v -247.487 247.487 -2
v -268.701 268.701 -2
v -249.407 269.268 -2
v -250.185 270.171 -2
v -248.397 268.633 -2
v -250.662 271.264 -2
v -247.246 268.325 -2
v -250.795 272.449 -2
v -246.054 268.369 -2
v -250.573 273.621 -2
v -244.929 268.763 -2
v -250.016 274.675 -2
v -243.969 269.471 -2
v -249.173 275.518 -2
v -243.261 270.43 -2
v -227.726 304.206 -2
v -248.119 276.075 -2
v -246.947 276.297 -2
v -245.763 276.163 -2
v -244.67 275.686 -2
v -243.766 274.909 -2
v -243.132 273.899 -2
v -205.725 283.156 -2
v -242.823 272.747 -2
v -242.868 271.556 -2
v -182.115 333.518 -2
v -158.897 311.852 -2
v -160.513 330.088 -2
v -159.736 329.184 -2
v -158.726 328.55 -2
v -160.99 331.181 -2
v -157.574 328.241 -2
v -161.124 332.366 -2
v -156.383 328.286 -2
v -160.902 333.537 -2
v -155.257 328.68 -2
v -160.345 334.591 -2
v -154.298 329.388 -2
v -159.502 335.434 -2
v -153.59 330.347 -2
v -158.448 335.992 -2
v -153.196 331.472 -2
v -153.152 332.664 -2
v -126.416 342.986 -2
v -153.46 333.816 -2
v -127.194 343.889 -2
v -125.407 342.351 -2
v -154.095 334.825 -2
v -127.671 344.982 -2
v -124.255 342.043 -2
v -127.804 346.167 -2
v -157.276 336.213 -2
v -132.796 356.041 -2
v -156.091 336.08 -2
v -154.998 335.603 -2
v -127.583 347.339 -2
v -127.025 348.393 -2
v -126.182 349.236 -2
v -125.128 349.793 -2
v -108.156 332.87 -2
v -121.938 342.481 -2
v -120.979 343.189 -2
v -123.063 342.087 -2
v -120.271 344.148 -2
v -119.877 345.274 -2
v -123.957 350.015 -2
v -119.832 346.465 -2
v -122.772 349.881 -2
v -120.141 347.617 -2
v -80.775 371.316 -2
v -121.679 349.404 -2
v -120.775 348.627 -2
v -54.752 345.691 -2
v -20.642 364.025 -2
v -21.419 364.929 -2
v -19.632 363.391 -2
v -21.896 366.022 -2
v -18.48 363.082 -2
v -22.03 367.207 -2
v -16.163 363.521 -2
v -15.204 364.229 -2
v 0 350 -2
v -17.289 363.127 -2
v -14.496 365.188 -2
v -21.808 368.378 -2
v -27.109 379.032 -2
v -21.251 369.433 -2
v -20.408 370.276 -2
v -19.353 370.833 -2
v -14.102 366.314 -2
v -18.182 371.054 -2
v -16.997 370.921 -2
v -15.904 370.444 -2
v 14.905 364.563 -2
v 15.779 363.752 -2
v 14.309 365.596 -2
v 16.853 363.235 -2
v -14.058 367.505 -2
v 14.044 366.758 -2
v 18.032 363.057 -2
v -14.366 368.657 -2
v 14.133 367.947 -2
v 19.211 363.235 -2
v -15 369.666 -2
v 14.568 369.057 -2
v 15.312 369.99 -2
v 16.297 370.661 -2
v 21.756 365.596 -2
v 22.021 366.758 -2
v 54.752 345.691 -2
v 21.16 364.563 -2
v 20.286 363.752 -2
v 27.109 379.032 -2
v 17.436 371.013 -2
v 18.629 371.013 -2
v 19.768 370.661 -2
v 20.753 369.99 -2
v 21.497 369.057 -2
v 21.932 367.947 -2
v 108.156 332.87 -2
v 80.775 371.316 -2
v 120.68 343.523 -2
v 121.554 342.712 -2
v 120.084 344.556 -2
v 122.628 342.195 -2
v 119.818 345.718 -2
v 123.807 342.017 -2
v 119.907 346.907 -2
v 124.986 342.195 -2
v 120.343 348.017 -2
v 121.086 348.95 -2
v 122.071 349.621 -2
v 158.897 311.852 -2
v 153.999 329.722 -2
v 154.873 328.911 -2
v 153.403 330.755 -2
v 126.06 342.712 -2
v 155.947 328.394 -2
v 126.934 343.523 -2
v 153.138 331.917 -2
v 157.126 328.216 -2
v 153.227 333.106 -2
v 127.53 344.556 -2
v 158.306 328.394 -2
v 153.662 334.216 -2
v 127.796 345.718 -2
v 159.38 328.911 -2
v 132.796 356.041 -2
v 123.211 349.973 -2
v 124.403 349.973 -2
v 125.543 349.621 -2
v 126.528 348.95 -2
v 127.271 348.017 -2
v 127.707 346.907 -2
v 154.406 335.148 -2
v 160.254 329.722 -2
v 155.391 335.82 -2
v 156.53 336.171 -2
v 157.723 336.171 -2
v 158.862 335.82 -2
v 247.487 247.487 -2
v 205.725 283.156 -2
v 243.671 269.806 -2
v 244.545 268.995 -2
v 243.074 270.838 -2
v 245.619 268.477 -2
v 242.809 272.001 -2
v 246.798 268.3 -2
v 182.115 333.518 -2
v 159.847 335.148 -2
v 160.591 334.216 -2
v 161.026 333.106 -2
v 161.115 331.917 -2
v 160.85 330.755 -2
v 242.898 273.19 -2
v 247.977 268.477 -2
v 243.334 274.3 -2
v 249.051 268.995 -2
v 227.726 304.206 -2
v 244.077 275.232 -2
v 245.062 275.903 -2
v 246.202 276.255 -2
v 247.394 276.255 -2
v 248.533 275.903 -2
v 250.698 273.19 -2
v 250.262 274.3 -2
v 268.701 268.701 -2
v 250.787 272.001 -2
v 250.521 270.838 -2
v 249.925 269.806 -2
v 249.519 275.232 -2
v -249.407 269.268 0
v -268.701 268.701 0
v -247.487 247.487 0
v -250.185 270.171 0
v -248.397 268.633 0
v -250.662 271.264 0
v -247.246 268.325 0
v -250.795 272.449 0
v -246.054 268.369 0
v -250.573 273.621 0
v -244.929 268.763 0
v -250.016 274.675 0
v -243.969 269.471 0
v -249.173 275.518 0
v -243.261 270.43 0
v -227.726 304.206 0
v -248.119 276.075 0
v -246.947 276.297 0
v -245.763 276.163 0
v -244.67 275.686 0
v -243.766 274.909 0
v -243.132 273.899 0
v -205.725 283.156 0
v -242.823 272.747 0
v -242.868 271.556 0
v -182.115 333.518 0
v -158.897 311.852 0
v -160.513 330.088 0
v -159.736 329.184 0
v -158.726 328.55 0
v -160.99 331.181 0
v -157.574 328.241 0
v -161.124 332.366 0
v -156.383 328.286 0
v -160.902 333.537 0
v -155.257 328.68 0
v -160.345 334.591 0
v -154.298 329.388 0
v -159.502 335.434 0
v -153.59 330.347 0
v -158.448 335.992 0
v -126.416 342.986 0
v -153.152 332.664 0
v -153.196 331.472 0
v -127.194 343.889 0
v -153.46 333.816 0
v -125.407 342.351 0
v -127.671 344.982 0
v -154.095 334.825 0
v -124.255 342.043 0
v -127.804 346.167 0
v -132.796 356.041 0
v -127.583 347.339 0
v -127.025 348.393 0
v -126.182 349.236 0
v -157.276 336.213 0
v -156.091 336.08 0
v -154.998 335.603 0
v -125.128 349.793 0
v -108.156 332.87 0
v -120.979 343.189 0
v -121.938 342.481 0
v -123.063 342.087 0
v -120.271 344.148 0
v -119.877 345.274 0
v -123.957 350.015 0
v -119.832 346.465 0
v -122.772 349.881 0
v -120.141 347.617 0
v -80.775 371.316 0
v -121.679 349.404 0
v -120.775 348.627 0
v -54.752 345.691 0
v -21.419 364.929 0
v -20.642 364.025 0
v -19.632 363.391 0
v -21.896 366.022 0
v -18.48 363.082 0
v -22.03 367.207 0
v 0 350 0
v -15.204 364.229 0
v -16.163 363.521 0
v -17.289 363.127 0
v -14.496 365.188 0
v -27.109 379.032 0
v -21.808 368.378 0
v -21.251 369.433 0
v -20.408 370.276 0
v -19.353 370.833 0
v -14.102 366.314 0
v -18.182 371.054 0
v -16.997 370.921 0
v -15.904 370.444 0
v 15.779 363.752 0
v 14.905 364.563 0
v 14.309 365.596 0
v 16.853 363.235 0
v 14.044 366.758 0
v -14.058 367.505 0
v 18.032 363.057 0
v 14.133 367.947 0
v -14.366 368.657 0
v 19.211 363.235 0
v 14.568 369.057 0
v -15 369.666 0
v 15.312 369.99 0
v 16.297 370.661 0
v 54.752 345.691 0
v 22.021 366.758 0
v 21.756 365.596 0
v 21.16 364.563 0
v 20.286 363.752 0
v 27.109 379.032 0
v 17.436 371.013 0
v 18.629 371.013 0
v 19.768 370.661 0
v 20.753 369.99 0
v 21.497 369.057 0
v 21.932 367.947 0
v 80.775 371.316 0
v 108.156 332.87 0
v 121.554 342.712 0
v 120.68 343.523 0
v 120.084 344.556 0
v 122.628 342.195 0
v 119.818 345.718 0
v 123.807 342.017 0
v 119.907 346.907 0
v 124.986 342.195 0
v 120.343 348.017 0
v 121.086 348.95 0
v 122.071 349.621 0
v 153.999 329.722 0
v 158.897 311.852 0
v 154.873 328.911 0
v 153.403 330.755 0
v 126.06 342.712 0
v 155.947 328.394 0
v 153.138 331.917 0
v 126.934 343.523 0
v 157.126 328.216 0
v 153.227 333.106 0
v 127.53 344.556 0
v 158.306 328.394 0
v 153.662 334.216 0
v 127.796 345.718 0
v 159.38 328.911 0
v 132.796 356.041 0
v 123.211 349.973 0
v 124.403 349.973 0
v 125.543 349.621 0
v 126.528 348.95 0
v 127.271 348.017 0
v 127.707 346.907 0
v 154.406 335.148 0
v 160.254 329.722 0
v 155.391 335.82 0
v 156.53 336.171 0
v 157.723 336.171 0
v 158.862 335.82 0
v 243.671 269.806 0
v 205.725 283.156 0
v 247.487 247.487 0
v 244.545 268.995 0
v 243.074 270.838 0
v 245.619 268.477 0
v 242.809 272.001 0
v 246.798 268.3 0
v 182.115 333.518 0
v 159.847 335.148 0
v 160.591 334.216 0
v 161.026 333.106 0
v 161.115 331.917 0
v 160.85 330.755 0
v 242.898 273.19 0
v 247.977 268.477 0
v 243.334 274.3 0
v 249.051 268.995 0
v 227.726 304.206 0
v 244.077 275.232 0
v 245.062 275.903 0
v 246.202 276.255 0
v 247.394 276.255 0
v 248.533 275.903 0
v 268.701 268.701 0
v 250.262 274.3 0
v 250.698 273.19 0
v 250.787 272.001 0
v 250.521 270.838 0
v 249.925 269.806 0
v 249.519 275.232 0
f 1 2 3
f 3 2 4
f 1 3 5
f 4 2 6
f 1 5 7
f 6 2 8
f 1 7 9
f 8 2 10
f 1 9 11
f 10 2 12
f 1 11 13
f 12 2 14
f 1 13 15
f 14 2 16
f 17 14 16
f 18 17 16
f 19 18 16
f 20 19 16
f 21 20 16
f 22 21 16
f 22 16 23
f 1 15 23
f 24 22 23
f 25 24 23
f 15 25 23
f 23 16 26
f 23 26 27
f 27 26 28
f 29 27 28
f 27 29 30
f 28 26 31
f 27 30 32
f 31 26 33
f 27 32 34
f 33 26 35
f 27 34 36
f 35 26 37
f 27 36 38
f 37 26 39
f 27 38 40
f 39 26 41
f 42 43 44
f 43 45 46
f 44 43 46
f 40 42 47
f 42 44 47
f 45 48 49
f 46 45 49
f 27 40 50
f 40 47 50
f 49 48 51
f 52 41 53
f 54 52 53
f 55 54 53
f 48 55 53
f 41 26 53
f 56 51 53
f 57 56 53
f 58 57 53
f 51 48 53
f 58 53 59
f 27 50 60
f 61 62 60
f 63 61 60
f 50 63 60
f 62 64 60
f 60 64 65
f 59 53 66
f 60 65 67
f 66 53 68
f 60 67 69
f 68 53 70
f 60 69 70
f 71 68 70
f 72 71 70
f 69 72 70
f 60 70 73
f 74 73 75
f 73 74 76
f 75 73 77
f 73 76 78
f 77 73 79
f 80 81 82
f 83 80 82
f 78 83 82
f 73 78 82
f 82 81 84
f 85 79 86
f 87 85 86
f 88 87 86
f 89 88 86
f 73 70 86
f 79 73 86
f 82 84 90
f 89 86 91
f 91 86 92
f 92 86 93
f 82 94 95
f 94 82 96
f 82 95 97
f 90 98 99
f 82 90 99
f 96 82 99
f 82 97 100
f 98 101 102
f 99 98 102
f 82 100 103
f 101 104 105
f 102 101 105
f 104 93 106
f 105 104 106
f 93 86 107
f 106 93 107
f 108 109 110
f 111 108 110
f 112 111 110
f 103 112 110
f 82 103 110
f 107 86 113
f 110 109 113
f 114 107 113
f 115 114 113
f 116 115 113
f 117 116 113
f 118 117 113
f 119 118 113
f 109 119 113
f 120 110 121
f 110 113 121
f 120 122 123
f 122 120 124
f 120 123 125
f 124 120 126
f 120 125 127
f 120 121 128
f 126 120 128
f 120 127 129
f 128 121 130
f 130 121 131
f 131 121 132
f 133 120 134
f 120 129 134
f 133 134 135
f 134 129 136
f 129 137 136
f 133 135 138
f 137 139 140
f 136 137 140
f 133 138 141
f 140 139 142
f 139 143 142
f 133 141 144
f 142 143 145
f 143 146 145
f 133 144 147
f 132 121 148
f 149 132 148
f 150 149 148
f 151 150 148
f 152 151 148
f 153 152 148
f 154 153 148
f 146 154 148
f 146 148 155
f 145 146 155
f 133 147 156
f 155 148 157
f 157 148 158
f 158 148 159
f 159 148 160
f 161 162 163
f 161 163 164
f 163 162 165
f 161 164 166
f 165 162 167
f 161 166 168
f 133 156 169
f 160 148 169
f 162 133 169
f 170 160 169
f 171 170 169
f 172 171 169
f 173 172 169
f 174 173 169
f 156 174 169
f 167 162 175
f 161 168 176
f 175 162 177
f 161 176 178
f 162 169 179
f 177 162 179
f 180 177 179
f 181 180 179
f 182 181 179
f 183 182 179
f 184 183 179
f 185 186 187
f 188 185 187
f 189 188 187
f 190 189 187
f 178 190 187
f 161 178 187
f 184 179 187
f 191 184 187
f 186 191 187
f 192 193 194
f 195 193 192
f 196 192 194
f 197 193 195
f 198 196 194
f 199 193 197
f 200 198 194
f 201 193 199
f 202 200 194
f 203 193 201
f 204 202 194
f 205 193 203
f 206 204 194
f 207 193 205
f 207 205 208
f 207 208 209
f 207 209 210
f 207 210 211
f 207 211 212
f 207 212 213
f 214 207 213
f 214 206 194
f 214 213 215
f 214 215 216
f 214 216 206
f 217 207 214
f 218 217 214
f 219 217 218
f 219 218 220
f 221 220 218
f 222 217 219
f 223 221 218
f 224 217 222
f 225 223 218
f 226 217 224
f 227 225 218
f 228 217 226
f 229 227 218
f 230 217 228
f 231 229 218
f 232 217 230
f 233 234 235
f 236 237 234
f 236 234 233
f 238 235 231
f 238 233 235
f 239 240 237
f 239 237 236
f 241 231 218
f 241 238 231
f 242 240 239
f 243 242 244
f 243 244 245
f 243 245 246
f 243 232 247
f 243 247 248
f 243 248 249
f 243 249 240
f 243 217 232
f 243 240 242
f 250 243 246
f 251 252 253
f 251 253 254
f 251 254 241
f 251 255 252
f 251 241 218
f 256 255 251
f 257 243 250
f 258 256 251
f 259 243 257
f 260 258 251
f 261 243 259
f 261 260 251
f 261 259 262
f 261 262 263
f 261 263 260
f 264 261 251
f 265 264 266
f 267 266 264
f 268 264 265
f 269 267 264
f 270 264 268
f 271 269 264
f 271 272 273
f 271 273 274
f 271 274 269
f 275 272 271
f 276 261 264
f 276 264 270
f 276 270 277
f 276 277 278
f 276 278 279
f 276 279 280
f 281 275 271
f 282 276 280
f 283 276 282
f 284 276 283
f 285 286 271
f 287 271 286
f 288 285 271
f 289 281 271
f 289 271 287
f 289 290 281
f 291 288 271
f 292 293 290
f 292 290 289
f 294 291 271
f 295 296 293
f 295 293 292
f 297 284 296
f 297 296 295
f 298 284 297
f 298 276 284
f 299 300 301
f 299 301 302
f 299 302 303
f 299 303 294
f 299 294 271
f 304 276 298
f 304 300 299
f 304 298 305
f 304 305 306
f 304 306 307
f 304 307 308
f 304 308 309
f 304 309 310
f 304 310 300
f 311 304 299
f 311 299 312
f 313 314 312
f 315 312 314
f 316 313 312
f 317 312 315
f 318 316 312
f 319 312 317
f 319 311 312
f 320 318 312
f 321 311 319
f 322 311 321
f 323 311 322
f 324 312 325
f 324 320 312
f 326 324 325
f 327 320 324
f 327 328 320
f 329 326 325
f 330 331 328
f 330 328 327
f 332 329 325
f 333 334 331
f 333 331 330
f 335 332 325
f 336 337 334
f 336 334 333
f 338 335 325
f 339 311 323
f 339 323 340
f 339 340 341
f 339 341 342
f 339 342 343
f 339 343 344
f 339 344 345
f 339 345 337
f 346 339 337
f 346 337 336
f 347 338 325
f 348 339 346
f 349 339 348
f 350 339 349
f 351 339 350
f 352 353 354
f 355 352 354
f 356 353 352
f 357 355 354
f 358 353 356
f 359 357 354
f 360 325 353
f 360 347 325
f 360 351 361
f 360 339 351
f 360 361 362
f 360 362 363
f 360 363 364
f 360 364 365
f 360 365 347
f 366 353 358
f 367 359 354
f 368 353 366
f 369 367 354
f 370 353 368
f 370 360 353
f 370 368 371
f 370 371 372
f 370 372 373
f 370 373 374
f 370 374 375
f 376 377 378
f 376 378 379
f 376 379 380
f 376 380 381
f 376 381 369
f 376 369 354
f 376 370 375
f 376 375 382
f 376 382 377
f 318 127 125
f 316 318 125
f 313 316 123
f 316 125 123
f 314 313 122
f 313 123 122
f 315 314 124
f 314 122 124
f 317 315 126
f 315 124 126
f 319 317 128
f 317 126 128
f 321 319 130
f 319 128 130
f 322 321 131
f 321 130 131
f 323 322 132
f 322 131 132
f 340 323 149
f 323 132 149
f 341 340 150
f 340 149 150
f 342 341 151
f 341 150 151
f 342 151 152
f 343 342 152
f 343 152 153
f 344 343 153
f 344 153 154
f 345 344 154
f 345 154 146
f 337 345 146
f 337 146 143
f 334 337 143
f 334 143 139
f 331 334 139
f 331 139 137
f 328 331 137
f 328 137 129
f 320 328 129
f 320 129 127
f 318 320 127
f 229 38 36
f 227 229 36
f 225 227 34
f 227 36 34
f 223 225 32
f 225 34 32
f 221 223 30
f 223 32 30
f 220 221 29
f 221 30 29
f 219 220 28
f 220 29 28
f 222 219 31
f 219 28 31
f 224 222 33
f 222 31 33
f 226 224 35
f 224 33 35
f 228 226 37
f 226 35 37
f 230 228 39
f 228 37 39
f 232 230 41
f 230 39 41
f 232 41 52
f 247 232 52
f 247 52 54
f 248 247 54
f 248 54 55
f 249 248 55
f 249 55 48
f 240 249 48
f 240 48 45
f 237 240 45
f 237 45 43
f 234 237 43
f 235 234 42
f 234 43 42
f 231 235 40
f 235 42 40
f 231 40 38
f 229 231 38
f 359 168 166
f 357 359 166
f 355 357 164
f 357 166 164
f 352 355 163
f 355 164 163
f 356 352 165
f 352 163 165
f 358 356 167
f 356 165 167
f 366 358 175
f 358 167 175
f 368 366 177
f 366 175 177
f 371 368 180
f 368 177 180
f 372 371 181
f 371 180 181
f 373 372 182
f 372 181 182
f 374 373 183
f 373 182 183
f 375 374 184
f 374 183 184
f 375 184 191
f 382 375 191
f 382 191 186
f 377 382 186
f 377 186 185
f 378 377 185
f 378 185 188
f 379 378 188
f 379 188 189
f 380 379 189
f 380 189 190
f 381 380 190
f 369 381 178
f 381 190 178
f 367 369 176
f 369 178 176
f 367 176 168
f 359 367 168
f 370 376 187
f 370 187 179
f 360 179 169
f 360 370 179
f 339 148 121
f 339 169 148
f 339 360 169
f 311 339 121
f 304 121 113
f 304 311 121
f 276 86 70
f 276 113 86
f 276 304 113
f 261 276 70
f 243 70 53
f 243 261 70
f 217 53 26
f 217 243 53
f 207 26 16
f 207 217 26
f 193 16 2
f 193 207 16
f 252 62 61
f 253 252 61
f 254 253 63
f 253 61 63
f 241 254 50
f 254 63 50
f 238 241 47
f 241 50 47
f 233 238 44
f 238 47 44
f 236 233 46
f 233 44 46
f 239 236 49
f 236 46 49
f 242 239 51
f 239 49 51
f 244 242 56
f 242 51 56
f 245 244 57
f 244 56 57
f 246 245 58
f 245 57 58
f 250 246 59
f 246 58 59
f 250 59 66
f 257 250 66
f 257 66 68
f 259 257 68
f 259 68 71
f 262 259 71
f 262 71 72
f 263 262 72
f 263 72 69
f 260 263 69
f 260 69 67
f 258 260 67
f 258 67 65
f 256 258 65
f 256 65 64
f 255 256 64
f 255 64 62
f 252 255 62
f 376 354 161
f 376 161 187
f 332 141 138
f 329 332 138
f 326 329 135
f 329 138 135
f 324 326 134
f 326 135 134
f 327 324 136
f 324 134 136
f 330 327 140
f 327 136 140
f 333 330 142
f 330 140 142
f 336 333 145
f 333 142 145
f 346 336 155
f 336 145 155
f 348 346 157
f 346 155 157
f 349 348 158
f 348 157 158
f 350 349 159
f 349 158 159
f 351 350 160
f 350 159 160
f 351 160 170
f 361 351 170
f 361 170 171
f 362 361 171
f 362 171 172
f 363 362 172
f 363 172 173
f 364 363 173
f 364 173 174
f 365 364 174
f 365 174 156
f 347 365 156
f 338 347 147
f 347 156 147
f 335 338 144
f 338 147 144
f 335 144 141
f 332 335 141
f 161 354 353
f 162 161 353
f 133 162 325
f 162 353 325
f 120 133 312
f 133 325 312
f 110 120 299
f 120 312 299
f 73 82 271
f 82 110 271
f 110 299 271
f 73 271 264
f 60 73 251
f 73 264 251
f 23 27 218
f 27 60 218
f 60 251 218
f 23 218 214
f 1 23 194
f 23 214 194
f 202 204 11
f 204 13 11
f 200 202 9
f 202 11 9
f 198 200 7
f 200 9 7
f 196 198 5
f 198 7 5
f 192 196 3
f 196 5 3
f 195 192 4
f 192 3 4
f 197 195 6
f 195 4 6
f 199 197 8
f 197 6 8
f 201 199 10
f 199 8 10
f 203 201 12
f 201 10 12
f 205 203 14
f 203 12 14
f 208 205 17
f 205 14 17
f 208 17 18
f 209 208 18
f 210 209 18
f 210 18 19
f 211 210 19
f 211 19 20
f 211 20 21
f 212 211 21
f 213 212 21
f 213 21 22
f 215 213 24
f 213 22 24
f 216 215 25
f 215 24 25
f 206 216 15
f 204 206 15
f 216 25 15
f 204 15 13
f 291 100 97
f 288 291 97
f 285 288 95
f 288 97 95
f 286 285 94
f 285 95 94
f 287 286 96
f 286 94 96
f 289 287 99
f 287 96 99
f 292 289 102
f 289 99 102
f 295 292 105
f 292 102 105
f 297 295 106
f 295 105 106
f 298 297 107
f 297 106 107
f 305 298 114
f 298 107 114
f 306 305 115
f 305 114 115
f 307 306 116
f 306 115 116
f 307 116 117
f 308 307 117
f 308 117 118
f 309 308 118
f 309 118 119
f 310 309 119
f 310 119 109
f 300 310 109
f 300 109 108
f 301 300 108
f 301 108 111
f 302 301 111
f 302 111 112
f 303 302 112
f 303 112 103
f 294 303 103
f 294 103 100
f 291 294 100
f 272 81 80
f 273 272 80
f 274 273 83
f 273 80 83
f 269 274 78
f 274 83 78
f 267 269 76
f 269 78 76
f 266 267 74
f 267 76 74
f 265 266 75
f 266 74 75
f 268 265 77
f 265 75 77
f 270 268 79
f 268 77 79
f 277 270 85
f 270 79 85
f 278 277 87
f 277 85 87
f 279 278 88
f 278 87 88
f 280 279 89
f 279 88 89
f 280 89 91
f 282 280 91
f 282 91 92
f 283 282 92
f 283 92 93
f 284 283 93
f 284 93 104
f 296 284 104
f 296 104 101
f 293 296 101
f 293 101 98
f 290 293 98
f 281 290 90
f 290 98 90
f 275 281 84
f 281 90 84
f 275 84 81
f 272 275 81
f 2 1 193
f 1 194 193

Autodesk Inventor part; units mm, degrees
ref_plane "YZ Plane" through (0, 0, 0) normal (1, 0, 0) x (0, 1, 0)
ref_plane "XZ Plane" through (0, 0, 0) normal (0, 1, 0) x (-1, 0, 0)
ref_plane "XY Plane" through (0, 0, 0) normal (0, 0, 1) x (1, 0, 0)
sketch "Sketch1" plane through (0, 0, 0) normal (0, 0, 1) x (1, 0, 0)
  circle A0 centre (0, 0) radius 350
  circle A1 centre (0, 0) radius 380
  line L0 (0, 0) -> (-268.7006, 268.7006)
  line L1 (0, 0) -> (0, 380)
  line L2 (0, 0) -> (268.7006, 268.7006)
  point P0 (-247.4874, 247.4874)
  point P1 (247.4874, 247.4874)
  dimension "d30" = 90
  dimension "d31" = 760
  dimension "d32" = 700
extrude "Plate1" add sketch "Sketch1" against normal blind 2 contours A0 L1 A1 L2 | L0 A1 L1 A0
sketch "Sketch2" plane through (0, 0, 0) normal (0, 0, 1) x (1, 0, 0)
  circle A0 centre (0, 0) radius 367.5
  arc A1 (268.7006, 268.7006) -> (-268.7006, 268.7006) centre (0, 0) ccw projected
  line L0 (0, 0) -> (268.7006, 268.7006) construction
  line L1 (0, 0) -> (246.7979, 272.2995) construction
  line L2 (157.1265, 332.2161) -> (0, 0) construction
  line L3 (0, 0) -> (0, 367.5) construction
  line L4 (0, 0) -> (18.0324, 367.0573) construction
  line L5 (0, 0) -> (123.807, 346.0174) construction
  dimension "d34" = 735
  dimension "d35" = 2.812
  dimension "d36" = 16.875
  dimension "d44" = 2.812
  dimension "d45" = 16.875
hole "Hole1" at (246.7979, 272.2995, 0) at (157.1265, 332.2161, 0) at (123.807, 346.0174, 0) at (18.0324, 367.0573, 0) direction (0, 0, -1) diameter 8 end through all
pattern_circular "Circular Pattern1" count 2 over 45 about axis through (0, 0, -10) along (0, 0, 1) of "Hole1"
equation "\"d31\" = Колесо_диам_1"
equation "\"d32\" = Колесо_диам_2"
equation "\"d44\" = d35"
equation "\"d45\" = d36"
equation "\"d42\" = Thickness"
equation "\"d15\" = Thickness"
equation "\"BendRadius\" = Thickness"
equation "\"BendReliefWidth\" = Thickness"
equation "\"BendReliefDepth\" = 0.5 * Thickness"
equation "\"CornerReliefSize\" = 4 * Thickness"
equation "\"MinimumRemnant\" = 2 * Thickness"
equation "\"TransitionRadius\" = BendRadius"
equation "\"JacobiRadiusSize\" = BendRadius"
equation "\"GapSize\" = Thickness"
equation "\"Колесо_диам_1\" = 760"
equation "\"Колесо_диам_2\" = 700"
equation "\"Thickness\" = 2"
properties part number "DMF2.0 01 43 Gear rim 3"
